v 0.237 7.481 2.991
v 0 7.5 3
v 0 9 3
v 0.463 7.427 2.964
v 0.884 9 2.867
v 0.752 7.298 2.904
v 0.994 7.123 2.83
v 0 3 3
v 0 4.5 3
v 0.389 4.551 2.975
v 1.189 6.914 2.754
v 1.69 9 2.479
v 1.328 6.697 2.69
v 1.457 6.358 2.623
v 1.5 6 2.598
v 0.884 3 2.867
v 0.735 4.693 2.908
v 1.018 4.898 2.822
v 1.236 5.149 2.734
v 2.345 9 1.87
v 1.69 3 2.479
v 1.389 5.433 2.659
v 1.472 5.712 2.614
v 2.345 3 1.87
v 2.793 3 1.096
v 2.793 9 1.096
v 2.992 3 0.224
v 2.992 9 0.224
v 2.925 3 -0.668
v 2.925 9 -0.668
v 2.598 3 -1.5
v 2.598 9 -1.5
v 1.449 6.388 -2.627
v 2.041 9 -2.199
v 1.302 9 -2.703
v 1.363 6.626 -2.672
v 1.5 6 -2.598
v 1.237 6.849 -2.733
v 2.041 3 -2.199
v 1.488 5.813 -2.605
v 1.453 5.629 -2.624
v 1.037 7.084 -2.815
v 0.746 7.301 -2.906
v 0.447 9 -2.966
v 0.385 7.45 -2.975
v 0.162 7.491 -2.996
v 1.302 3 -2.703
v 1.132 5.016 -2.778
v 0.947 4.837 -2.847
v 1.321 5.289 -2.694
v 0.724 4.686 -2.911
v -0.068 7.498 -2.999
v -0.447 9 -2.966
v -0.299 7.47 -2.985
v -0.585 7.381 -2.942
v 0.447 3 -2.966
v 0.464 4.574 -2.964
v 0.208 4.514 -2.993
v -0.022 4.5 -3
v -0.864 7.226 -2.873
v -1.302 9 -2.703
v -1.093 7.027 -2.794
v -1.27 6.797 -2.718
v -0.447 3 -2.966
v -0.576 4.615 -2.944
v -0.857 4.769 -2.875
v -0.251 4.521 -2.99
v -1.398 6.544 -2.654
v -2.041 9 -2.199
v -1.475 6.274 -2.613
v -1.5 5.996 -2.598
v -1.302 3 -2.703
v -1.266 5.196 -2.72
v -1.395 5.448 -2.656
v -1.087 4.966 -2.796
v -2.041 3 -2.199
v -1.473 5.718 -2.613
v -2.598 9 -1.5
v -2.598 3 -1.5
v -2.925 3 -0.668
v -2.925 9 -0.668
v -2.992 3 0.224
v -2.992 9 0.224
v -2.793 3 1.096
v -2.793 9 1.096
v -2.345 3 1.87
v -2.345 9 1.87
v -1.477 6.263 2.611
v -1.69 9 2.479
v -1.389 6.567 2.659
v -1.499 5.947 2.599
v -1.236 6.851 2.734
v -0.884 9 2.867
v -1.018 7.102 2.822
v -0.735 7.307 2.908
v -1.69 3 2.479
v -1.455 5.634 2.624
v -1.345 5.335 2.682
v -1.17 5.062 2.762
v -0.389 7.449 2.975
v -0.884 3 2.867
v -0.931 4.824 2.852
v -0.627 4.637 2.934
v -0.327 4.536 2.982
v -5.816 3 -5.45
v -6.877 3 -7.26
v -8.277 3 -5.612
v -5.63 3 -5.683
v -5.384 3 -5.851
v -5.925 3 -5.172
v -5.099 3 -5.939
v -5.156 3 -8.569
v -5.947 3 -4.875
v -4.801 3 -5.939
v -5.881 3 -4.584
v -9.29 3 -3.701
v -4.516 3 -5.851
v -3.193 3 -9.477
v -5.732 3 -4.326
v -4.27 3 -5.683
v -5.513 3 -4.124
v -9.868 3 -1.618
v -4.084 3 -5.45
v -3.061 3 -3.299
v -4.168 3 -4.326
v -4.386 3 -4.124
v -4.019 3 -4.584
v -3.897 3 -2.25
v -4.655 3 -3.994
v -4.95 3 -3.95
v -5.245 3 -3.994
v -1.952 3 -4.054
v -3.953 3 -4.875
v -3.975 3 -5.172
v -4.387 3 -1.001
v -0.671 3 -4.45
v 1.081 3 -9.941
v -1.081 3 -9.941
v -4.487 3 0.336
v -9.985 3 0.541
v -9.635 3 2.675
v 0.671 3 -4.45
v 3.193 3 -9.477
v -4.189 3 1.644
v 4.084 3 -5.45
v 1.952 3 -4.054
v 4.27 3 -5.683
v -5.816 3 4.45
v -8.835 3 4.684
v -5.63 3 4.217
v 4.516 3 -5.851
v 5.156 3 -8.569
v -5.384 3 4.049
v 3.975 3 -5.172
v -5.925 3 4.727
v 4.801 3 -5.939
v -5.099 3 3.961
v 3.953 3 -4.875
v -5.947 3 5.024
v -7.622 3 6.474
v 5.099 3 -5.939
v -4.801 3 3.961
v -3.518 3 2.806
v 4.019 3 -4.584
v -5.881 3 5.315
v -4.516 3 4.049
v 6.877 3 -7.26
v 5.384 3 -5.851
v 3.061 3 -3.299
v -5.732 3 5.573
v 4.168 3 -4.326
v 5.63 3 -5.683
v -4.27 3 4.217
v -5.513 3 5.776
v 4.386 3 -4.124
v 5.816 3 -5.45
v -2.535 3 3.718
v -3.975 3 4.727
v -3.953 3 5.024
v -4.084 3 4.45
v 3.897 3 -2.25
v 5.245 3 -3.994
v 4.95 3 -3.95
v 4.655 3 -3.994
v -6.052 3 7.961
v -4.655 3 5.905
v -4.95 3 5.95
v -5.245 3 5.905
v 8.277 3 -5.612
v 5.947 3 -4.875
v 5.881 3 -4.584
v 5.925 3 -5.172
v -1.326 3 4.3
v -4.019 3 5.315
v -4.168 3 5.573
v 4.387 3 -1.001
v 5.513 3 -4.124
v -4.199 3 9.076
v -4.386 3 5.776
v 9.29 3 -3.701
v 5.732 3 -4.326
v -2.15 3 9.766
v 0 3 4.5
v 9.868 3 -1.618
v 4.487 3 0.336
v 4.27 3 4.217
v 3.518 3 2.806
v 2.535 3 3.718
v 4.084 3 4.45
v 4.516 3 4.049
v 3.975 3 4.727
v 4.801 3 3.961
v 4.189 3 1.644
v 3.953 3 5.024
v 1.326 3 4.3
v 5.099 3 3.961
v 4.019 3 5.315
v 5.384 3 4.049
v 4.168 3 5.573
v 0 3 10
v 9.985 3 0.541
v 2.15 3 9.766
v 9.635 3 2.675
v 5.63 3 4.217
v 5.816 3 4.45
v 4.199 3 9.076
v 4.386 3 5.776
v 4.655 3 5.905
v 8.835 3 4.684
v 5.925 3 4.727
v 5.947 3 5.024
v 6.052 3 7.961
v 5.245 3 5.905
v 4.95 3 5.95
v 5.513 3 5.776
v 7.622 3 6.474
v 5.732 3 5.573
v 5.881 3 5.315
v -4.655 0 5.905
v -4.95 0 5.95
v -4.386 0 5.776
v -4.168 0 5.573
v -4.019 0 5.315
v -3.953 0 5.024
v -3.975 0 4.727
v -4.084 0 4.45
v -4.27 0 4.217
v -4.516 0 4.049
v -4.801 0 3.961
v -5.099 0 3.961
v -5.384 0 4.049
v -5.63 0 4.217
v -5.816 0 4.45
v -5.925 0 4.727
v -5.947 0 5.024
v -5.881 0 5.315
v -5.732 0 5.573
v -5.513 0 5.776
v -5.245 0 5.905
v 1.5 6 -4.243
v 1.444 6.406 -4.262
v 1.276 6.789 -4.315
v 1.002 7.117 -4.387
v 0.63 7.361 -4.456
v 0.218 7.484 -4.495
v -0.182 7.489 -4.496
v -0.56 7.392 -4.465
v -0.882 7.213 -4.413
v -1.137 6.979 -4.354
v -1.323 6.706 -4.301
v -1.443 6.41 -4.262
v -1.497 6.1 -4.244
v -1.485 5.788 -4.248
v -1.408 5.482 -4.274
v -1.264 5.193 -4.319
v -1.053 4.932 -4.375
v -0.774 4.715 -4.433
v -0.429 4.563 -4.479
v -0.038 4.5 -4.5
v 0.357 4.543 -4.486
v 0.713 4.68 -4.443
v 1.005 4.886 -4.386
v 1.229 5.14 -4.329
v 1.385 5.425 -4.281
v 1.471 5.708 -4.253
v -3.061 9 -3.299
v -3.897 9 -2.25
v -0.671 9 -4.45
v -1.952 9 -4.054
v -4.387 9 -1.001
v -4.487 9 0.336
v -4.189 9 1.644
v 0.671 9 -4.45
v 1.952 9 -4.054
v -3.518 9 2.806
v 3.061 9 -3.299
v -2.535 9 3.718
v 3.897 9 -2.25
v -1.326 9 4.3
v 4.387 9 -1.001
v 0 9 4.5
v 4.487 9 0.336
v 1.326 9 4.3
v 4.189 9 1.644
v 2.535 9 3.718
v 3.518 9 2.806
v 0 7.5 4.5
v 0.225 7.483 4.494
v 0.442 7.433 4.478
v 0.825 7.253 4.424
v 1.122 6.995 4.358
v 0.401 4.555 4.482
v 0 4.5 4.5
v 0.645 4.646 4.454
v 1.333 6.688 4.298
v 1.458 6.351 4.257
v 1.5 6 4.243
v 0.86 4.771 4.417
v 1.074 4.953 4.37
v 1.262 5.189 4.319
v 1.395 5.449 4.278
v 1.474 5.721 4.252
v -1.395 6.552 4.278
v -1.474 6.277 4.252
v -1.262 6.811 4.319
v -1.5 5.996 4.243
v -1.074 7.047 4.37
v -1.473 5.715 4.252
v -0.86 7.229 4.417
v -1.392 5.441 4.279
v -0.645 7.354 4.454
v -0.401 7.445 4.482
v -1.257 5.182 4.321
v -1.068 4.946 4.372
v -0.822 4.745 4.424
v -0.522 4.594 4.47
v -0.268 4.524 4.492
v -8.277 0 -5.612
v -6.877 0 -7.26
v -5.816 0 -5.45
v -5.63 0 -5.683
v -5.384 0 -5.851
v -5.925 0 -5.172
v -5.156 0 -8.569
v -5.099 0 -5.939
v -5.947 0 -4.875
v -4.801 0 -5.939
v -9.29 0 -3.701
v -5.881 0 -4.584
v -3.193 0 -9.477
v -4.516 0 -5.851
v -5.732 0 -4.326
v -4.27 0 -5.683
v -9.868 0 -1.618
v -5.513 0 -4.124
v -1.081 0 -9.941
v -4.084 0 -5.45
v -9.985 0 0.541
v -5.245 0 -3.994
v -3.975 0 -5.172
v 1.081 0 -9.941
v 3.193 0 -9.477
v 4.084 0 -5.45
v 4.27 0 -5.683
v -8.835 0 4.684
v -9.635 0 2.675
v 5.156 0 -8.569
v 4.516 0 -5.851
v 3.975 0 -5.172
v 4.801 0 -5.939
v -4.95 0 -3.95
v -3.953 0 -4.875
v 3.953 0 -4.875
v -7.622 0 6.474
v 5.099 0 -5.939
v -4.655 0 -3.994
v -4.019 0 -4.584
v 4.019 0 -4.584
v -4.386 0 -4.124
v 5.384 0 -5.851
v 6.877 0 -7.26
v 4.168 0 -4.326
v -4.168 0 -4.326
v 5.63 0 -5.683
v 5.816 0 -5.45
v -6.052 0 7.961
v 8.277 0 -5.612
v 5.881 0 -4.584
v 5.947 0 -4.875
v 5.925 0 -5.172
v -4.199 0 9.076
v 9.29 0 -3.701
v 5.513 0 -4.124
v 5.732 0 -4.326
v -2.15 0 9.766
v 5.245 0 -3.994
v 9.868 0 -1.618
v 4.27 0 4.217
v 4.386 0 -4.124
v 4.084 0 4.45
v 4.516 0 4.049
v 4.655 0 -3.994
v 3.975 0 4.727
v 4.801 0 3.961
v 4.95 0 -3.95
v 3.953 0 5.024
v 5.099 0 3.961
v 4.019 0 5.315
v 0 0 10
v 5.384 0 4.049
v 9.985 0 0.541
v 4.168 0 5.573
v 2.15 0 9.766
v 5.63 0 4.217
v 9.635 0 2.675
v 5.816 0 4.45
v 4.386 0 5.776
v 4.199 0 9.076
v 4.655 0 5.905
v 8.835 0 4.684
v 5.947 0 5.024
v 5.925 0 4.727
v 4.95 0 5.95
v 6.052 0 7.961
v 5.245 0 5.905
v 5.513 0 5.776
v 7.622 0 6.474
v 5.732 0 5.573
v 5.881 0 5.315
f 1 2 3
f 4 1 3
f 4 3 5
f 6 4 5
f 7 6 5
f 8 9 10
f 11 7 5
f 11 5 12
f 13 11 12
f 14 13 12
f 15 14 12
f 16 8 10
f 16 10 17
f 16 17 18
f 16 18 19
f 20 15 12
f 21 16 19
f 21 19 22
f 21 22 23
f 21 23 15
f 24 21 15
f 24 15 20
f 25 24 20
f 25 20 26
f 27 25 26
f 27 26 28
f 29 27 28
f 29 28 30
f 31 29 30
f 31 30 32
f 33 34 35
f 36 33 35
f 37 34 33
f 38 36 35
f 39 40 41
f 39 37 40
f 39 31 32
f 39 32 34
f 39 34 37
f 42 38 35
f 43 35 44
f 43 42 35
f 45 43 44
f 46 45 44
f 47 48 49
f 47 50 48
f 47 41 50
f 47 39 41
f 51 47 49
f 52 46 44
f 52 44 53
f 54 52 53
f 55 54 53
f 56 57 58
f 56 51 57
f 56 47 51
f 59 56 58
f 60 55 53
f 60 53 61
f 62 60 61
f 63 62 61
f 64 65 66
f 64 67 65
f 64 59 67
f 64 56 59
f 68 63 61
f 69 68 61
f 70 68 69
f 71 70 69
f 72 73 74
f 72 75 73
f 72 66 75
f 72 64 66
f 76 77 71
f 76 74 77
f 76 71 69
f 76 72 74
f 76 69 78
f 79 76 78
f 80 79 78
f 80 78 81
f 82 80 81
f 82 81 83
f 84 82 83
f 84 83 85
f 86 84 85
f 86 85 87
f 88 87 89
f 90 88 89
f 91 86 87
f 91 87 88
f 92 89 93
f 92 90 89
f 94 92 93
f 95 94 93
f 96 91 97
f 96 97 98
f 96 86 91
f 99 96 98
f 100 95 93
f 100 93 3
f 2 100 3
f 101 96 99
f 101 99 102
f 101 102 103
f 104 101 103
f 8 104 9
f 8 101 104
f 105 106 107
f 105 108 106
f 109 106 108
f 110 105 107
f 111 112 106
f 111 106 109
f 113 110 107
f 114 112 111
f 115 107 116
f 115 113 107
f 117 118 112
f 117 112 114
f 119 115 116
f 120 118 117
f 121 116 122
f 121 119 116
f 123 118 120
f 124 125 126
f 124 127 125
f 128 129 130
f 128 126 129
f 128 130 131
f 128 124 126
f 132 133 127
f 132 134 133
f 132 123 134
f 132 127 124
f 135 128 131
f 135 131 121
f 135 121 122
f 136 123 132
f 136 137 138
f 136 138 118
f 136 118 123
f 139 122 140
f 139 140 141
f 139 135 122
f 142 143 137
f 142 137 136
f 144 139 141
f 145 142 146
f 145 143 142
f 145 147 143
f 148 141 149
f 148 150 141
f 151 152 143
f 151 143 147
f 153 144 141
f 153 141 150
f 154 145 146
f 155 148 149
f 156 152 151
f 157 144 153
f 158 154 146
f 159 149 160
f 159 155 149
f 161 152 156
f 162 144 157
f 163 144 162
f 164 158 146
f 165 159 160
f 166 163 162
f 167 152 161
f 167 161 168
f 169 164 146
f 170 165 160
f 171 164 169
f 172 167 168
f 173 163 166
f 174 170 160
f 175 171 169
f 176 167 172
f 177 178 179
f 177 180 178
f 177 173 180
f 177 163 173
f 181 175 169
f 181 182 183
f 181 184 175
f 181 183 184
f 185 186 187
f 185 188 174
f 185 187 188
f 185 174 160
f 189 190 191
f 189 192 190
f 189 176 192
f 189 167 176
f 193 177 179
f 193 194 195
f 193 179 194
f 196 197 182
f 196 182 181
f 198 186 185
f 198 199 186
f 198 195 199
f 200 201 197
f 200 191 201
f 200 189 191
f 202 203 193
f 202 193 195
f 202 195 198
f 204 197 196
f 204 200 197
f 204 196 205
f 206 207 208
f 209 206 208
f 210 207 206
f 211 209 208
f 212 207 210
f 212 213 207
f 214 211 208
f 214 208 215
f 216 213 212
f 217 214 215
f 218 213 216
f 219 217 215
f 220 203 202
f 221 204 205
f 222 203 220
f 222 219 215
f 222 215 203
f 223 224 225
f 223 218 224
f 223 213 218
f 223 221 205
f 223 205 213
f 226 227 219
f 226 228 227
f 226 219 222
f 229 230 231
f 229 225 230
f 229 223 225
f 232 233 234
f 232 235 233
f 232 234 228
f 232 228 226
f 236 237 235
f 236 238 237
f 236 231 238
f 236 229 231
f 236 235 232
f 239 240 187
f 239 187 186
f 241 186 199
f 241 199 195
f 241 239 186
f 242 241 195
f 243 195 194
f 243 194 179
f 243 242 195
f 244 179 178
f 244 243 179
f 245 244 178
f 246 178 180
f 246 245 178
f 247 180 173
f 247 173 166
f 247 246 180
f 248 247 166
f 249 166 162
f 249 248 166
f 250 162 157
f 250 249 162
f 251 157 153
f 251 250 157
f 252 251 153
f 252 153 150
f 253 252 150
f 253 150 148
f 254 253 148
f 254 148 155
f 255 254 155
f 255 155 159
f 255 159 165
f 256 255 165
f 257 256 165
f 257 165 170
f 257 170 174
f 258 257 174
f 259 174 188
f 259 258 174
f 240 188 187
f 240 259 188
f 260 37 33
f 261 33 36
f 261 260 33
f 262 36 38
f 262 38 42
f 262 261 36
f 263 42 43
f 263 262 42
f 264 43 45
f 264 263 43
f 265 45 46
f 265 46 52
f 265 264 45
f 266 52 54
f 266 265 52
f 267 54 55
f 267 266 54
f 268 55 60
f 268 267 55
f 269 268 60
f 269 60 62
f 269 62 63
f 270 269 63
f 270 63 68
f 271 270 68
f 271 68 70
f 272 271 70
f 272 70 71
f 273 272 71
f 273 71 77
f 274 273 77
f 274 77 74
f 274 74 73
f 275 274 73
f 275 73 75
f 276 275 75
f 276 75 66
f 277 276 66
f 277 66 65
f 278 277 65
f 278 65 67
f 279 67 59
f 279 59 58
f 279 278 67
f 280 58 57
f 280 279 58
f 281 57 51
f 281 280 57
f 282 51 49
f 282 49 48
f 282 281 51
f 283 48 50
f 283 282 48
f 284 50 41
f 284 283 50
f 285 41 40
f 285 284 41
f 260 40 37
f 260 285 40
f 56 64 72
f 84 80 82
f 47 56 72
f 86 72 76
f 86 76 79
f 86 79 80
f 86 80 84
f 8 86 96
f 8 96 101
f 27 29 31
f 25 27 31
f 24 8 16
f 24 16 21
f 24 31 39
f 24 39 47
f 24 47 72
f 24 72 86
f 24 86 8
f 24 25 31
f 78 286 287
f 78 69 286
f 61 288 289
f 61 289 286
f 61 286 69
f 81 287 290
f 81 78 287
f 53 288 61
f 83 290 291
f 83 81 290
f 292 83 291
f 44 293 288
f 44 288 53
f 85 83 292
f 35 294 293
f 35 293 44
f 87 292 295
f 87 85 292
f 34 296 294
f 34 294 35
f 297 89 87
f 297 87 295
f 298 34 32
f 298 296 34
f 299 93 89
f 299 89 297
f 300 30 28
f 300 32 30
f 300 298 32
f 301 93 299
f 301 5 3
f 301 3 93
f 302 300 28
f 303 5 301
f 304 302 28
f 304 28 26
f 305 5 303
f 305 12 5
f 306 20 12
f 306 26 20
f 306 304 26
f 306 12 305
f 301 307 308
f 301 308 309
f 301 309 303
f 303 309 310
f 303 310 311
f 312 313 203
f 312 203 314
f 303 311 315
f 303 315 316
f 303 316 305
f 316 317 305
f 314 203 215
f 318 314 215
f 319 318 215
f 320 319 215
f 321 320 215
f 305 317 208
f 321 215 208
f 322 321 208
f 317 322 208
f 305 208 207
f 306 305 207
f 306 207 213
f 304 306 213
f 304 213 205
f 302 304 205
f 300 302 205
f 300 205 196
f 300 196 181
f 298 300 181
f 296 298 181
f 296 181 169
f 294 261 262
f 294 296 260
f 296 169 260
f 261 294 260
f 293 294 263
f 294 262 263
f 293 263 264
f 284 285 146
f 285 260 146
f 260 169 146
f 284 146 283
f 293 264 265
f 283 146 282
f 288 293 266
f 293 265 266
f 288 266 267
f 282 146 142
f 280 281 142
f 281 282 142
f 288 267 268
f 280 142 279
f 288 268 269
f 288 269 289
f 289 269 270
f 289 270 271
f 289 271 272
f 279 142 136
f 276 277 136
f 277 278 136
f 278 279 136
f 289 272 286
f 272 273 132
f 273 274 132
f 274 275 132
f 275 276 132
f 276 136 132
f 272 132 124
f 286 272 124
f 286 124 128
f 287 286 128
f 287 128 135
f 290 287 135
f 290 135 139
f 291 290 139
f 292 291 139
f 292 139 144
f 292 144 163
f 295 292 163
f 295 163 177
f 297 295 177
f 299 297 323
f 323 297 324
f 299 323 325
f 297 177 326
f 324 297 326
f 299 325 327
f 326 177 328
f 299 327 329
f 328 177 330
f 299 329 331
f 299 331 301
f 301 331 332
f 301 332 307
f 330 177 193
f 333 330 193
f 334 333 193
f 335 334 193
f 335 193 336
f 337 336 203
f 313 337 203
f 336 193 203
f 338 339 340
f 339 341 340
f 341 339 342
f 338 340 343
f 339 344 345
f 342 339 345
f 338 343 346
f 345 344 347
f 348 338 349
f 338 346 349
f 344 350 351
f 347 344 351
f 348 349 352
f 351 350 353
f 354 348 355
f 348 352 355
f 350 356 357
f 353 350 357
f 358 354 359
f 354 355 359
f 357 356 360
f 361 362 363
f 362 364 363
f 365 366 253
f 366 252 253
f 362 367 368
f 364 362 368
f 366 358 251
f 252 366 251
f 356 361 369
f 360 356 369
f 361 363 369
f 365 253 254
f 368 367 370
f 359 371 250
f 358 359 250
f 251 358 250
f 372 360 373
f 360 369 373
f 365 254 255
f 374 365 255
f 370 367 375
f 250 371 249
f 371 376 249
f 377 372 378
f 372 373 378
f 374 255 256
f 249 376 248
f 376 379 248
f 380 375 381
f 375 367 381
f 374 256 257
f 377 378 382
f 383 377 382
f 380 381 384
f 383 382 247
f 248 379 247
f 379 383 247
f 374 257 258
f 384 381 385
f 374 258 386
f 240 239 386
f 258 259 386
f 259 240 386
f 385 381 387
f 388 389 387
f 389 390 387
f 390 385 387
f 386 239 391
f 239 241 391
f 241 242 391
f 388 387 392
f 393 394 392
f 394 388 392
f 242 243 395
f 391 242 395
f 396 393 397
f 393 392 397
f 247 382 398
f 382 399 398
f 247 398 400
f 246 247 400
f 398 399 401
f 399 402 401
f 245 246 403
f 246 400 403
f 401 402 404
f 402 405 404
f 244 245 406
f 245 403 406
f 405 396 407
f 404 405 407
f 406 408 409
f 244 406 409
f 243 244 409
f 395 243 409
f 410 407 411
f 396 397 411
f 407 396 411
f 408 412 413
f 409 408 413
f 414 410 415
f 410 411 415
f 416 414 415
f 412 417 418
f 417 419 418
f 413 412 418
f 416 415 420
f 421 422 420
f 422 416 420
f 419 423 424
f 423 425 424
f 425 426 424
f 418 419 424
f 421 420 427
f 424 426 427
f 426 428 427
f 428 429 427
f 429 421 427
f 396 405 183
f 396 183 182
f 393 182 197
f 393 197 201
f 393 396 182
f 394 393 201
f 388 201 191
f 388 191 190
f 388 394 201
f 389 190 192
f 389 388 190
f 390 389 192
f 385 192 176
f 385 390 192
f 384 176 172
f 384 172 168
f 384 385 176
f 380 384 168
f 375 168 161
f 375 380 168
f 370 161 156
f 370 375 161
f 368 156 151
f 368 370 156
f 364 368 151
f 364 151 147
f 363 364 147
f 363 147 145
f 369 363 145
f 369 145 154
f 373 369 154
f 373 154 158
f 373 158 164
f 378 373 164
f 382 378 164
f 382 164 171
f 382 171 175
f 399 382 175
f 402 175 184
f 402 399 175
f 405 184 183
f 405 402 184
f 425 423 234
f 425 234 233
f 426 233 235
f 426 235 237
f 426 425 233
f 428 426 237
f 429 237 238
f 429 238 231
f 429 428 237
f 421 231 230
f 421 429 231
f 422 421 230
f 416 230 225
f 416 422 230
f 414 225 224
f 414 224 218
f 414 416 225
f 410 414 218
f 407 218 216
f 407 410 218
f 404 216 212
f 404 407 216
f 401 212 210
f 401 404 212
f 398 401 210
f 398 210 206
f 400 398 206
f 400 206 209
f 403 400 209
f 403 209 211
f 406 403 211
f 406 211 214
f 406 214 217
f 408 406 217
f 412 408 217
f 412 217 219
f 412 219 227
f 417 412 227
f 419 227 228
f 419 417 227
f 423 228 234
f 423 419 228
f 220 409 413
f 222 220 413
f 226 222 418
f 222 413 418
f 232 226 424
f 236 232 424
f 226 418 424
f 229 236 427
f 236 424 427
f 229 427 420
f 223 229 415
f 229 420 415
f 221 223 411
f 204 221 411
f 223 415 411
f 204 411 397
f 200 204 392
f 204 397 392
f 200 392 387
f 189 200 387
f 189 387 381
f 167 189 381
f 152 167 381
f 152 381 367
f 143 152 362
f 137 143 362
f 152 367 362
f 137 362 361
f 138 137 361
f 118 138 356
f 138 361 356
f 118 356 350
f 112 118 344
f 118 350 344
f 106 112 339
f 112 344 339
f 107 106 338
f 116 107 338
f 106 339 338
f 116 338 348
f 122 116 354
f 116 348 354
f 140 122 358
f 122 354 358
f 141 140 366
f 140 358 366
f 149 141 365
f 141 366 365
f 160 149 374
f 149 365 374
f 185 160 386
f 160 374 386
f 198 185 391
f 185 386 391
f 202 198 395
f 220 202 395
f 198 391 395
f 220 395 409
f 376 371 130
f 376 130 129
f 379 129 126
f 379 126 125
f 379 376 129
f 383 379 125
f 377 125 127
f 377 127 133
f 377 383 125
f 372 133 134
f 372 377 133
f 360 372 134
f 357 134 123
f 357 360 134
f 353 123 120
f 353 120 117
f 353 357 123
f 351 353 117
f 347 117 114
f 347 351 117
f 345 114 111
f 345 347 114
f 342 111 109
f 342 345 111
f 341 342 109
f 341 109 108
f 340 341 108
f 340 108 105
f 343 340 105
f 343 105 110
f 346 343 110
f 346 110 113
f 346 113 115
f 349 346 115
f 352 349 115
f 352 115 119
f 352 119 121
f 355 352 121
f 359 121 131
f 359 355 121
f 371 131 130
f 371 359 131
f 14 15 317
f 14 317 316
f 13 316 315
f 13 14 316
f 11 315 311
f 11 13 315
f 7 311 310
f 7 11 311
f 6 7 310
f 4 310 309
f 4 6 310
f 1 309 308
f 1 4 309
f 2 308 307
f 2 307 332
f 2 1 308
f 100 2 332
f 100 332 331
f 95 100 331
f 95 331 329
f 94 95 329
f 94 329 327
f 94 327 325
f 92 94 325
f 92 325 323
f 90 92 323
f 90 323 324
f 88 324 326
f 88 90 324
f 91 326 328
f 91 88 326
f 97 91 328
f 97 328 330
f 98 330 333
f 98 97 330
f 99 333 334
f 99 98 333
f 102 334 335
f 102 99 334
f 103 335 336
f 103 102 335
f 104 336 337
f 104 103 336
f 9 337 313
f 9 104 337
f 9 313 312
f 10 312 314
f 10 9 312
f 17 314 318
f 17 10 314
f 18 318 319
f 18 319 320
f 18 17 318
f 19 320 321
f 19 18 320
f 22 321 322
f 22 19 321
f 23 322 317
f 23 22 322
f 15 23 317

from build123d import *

# Parameters (mm, degrees)
CROQUIS1_R                 = 10
CROQUIS1_R_2               = 1
SALIENTE_EXTRUIR1_DEPTH    = 3
SALIENTE_EXTRUIR2_START    = 3
CROQUIS1_3_R               = 4.5
CROQUIS1_3_R_2             = 3
SALIENTE_EXTRUIR2_DEPTH    = 6
CORTAR_EXTRUIR1_DEPTH      = 17.763054614
CORTAR_EXTRUIR1_DEPTH_BACK = 17.763054614
CROQUIS2_R                 = 1.5


with BuildPart() as part:
    # Croquis1 → Saliente-Extruir1 (new body)
    with BuildSketch(Plane(origin=(0, 0, 0), x_dir=(1, 0, 0), z_dir=(0, 1, 0))):
        with Locations(Location((0, 0, 0), (0, 0, 270))):
            Circle(CROQUIS1_R)
        with Locations(Location((-4.949747468, 4.949747468, 0), (0, 0, 270))):
            Circle(CROQUIS1_R_2, mode=Mode.SUBTRACT)
        with Locations(Location((4.949747468, 4.949747468, 0), (0, 0, 270))):
            Circle(CROQUIS1_R_2, mode=Mode.SUBTRACT)
        with Locations(Location((4.949747468, -4.949747468, 0), (0, 0, 270))):
            Circle(CROQUIS1_R_2, mode=Mode.SUBTRACT)
        with Locations(Location((-4.949747468, -4.949747468, 0), (0, 0, 270))):
            Circle(CROQUIS1_R_2, mode=Mode.SUBTRACT)
    extrude(amount=SALIENTE_EXTRUIR1_DEPTH)

    # Croquis1<3> → Saliente-Extruir2 (add)
    with BuildSketch(Plane(origin=(0, 0, 0), x_dir=(1, 0, 0), z_dir=(0, 1, 0)).offset(SALIENTE_EXTRUIR2_START)):
        with Locations(Location((0, 0, 0), (0, 0, 270))):
            Circle(CROQUIS1_3_R)
        with Locations(Location((0, 0, 0), (0, 0, 270))):
            Circle(CROQUIS1_3_R_2, mode=Mode.SUBTRACT)
    extrude(amount=SALIENTE_EXTRUIR2_DEPTH)

    # Croquis2 → Cortar-Extruir1 (cut, two sides: drawn at the far end of the back side and taken through both)
    with BuildSketch(Plane.XY.offset(-CORTAR_EXTRUIR1_DEPTH_BACK)):
        with Locations((0, 6)):
            Circle(CROQUIS2_R)
    extrude(amount=CORTAR_EXTRUIR1_DEPTH + CORTAR_EXTRUIR1_DEPTH_BACK, mode=Mode.SUBTRACT)


solid = part.part
